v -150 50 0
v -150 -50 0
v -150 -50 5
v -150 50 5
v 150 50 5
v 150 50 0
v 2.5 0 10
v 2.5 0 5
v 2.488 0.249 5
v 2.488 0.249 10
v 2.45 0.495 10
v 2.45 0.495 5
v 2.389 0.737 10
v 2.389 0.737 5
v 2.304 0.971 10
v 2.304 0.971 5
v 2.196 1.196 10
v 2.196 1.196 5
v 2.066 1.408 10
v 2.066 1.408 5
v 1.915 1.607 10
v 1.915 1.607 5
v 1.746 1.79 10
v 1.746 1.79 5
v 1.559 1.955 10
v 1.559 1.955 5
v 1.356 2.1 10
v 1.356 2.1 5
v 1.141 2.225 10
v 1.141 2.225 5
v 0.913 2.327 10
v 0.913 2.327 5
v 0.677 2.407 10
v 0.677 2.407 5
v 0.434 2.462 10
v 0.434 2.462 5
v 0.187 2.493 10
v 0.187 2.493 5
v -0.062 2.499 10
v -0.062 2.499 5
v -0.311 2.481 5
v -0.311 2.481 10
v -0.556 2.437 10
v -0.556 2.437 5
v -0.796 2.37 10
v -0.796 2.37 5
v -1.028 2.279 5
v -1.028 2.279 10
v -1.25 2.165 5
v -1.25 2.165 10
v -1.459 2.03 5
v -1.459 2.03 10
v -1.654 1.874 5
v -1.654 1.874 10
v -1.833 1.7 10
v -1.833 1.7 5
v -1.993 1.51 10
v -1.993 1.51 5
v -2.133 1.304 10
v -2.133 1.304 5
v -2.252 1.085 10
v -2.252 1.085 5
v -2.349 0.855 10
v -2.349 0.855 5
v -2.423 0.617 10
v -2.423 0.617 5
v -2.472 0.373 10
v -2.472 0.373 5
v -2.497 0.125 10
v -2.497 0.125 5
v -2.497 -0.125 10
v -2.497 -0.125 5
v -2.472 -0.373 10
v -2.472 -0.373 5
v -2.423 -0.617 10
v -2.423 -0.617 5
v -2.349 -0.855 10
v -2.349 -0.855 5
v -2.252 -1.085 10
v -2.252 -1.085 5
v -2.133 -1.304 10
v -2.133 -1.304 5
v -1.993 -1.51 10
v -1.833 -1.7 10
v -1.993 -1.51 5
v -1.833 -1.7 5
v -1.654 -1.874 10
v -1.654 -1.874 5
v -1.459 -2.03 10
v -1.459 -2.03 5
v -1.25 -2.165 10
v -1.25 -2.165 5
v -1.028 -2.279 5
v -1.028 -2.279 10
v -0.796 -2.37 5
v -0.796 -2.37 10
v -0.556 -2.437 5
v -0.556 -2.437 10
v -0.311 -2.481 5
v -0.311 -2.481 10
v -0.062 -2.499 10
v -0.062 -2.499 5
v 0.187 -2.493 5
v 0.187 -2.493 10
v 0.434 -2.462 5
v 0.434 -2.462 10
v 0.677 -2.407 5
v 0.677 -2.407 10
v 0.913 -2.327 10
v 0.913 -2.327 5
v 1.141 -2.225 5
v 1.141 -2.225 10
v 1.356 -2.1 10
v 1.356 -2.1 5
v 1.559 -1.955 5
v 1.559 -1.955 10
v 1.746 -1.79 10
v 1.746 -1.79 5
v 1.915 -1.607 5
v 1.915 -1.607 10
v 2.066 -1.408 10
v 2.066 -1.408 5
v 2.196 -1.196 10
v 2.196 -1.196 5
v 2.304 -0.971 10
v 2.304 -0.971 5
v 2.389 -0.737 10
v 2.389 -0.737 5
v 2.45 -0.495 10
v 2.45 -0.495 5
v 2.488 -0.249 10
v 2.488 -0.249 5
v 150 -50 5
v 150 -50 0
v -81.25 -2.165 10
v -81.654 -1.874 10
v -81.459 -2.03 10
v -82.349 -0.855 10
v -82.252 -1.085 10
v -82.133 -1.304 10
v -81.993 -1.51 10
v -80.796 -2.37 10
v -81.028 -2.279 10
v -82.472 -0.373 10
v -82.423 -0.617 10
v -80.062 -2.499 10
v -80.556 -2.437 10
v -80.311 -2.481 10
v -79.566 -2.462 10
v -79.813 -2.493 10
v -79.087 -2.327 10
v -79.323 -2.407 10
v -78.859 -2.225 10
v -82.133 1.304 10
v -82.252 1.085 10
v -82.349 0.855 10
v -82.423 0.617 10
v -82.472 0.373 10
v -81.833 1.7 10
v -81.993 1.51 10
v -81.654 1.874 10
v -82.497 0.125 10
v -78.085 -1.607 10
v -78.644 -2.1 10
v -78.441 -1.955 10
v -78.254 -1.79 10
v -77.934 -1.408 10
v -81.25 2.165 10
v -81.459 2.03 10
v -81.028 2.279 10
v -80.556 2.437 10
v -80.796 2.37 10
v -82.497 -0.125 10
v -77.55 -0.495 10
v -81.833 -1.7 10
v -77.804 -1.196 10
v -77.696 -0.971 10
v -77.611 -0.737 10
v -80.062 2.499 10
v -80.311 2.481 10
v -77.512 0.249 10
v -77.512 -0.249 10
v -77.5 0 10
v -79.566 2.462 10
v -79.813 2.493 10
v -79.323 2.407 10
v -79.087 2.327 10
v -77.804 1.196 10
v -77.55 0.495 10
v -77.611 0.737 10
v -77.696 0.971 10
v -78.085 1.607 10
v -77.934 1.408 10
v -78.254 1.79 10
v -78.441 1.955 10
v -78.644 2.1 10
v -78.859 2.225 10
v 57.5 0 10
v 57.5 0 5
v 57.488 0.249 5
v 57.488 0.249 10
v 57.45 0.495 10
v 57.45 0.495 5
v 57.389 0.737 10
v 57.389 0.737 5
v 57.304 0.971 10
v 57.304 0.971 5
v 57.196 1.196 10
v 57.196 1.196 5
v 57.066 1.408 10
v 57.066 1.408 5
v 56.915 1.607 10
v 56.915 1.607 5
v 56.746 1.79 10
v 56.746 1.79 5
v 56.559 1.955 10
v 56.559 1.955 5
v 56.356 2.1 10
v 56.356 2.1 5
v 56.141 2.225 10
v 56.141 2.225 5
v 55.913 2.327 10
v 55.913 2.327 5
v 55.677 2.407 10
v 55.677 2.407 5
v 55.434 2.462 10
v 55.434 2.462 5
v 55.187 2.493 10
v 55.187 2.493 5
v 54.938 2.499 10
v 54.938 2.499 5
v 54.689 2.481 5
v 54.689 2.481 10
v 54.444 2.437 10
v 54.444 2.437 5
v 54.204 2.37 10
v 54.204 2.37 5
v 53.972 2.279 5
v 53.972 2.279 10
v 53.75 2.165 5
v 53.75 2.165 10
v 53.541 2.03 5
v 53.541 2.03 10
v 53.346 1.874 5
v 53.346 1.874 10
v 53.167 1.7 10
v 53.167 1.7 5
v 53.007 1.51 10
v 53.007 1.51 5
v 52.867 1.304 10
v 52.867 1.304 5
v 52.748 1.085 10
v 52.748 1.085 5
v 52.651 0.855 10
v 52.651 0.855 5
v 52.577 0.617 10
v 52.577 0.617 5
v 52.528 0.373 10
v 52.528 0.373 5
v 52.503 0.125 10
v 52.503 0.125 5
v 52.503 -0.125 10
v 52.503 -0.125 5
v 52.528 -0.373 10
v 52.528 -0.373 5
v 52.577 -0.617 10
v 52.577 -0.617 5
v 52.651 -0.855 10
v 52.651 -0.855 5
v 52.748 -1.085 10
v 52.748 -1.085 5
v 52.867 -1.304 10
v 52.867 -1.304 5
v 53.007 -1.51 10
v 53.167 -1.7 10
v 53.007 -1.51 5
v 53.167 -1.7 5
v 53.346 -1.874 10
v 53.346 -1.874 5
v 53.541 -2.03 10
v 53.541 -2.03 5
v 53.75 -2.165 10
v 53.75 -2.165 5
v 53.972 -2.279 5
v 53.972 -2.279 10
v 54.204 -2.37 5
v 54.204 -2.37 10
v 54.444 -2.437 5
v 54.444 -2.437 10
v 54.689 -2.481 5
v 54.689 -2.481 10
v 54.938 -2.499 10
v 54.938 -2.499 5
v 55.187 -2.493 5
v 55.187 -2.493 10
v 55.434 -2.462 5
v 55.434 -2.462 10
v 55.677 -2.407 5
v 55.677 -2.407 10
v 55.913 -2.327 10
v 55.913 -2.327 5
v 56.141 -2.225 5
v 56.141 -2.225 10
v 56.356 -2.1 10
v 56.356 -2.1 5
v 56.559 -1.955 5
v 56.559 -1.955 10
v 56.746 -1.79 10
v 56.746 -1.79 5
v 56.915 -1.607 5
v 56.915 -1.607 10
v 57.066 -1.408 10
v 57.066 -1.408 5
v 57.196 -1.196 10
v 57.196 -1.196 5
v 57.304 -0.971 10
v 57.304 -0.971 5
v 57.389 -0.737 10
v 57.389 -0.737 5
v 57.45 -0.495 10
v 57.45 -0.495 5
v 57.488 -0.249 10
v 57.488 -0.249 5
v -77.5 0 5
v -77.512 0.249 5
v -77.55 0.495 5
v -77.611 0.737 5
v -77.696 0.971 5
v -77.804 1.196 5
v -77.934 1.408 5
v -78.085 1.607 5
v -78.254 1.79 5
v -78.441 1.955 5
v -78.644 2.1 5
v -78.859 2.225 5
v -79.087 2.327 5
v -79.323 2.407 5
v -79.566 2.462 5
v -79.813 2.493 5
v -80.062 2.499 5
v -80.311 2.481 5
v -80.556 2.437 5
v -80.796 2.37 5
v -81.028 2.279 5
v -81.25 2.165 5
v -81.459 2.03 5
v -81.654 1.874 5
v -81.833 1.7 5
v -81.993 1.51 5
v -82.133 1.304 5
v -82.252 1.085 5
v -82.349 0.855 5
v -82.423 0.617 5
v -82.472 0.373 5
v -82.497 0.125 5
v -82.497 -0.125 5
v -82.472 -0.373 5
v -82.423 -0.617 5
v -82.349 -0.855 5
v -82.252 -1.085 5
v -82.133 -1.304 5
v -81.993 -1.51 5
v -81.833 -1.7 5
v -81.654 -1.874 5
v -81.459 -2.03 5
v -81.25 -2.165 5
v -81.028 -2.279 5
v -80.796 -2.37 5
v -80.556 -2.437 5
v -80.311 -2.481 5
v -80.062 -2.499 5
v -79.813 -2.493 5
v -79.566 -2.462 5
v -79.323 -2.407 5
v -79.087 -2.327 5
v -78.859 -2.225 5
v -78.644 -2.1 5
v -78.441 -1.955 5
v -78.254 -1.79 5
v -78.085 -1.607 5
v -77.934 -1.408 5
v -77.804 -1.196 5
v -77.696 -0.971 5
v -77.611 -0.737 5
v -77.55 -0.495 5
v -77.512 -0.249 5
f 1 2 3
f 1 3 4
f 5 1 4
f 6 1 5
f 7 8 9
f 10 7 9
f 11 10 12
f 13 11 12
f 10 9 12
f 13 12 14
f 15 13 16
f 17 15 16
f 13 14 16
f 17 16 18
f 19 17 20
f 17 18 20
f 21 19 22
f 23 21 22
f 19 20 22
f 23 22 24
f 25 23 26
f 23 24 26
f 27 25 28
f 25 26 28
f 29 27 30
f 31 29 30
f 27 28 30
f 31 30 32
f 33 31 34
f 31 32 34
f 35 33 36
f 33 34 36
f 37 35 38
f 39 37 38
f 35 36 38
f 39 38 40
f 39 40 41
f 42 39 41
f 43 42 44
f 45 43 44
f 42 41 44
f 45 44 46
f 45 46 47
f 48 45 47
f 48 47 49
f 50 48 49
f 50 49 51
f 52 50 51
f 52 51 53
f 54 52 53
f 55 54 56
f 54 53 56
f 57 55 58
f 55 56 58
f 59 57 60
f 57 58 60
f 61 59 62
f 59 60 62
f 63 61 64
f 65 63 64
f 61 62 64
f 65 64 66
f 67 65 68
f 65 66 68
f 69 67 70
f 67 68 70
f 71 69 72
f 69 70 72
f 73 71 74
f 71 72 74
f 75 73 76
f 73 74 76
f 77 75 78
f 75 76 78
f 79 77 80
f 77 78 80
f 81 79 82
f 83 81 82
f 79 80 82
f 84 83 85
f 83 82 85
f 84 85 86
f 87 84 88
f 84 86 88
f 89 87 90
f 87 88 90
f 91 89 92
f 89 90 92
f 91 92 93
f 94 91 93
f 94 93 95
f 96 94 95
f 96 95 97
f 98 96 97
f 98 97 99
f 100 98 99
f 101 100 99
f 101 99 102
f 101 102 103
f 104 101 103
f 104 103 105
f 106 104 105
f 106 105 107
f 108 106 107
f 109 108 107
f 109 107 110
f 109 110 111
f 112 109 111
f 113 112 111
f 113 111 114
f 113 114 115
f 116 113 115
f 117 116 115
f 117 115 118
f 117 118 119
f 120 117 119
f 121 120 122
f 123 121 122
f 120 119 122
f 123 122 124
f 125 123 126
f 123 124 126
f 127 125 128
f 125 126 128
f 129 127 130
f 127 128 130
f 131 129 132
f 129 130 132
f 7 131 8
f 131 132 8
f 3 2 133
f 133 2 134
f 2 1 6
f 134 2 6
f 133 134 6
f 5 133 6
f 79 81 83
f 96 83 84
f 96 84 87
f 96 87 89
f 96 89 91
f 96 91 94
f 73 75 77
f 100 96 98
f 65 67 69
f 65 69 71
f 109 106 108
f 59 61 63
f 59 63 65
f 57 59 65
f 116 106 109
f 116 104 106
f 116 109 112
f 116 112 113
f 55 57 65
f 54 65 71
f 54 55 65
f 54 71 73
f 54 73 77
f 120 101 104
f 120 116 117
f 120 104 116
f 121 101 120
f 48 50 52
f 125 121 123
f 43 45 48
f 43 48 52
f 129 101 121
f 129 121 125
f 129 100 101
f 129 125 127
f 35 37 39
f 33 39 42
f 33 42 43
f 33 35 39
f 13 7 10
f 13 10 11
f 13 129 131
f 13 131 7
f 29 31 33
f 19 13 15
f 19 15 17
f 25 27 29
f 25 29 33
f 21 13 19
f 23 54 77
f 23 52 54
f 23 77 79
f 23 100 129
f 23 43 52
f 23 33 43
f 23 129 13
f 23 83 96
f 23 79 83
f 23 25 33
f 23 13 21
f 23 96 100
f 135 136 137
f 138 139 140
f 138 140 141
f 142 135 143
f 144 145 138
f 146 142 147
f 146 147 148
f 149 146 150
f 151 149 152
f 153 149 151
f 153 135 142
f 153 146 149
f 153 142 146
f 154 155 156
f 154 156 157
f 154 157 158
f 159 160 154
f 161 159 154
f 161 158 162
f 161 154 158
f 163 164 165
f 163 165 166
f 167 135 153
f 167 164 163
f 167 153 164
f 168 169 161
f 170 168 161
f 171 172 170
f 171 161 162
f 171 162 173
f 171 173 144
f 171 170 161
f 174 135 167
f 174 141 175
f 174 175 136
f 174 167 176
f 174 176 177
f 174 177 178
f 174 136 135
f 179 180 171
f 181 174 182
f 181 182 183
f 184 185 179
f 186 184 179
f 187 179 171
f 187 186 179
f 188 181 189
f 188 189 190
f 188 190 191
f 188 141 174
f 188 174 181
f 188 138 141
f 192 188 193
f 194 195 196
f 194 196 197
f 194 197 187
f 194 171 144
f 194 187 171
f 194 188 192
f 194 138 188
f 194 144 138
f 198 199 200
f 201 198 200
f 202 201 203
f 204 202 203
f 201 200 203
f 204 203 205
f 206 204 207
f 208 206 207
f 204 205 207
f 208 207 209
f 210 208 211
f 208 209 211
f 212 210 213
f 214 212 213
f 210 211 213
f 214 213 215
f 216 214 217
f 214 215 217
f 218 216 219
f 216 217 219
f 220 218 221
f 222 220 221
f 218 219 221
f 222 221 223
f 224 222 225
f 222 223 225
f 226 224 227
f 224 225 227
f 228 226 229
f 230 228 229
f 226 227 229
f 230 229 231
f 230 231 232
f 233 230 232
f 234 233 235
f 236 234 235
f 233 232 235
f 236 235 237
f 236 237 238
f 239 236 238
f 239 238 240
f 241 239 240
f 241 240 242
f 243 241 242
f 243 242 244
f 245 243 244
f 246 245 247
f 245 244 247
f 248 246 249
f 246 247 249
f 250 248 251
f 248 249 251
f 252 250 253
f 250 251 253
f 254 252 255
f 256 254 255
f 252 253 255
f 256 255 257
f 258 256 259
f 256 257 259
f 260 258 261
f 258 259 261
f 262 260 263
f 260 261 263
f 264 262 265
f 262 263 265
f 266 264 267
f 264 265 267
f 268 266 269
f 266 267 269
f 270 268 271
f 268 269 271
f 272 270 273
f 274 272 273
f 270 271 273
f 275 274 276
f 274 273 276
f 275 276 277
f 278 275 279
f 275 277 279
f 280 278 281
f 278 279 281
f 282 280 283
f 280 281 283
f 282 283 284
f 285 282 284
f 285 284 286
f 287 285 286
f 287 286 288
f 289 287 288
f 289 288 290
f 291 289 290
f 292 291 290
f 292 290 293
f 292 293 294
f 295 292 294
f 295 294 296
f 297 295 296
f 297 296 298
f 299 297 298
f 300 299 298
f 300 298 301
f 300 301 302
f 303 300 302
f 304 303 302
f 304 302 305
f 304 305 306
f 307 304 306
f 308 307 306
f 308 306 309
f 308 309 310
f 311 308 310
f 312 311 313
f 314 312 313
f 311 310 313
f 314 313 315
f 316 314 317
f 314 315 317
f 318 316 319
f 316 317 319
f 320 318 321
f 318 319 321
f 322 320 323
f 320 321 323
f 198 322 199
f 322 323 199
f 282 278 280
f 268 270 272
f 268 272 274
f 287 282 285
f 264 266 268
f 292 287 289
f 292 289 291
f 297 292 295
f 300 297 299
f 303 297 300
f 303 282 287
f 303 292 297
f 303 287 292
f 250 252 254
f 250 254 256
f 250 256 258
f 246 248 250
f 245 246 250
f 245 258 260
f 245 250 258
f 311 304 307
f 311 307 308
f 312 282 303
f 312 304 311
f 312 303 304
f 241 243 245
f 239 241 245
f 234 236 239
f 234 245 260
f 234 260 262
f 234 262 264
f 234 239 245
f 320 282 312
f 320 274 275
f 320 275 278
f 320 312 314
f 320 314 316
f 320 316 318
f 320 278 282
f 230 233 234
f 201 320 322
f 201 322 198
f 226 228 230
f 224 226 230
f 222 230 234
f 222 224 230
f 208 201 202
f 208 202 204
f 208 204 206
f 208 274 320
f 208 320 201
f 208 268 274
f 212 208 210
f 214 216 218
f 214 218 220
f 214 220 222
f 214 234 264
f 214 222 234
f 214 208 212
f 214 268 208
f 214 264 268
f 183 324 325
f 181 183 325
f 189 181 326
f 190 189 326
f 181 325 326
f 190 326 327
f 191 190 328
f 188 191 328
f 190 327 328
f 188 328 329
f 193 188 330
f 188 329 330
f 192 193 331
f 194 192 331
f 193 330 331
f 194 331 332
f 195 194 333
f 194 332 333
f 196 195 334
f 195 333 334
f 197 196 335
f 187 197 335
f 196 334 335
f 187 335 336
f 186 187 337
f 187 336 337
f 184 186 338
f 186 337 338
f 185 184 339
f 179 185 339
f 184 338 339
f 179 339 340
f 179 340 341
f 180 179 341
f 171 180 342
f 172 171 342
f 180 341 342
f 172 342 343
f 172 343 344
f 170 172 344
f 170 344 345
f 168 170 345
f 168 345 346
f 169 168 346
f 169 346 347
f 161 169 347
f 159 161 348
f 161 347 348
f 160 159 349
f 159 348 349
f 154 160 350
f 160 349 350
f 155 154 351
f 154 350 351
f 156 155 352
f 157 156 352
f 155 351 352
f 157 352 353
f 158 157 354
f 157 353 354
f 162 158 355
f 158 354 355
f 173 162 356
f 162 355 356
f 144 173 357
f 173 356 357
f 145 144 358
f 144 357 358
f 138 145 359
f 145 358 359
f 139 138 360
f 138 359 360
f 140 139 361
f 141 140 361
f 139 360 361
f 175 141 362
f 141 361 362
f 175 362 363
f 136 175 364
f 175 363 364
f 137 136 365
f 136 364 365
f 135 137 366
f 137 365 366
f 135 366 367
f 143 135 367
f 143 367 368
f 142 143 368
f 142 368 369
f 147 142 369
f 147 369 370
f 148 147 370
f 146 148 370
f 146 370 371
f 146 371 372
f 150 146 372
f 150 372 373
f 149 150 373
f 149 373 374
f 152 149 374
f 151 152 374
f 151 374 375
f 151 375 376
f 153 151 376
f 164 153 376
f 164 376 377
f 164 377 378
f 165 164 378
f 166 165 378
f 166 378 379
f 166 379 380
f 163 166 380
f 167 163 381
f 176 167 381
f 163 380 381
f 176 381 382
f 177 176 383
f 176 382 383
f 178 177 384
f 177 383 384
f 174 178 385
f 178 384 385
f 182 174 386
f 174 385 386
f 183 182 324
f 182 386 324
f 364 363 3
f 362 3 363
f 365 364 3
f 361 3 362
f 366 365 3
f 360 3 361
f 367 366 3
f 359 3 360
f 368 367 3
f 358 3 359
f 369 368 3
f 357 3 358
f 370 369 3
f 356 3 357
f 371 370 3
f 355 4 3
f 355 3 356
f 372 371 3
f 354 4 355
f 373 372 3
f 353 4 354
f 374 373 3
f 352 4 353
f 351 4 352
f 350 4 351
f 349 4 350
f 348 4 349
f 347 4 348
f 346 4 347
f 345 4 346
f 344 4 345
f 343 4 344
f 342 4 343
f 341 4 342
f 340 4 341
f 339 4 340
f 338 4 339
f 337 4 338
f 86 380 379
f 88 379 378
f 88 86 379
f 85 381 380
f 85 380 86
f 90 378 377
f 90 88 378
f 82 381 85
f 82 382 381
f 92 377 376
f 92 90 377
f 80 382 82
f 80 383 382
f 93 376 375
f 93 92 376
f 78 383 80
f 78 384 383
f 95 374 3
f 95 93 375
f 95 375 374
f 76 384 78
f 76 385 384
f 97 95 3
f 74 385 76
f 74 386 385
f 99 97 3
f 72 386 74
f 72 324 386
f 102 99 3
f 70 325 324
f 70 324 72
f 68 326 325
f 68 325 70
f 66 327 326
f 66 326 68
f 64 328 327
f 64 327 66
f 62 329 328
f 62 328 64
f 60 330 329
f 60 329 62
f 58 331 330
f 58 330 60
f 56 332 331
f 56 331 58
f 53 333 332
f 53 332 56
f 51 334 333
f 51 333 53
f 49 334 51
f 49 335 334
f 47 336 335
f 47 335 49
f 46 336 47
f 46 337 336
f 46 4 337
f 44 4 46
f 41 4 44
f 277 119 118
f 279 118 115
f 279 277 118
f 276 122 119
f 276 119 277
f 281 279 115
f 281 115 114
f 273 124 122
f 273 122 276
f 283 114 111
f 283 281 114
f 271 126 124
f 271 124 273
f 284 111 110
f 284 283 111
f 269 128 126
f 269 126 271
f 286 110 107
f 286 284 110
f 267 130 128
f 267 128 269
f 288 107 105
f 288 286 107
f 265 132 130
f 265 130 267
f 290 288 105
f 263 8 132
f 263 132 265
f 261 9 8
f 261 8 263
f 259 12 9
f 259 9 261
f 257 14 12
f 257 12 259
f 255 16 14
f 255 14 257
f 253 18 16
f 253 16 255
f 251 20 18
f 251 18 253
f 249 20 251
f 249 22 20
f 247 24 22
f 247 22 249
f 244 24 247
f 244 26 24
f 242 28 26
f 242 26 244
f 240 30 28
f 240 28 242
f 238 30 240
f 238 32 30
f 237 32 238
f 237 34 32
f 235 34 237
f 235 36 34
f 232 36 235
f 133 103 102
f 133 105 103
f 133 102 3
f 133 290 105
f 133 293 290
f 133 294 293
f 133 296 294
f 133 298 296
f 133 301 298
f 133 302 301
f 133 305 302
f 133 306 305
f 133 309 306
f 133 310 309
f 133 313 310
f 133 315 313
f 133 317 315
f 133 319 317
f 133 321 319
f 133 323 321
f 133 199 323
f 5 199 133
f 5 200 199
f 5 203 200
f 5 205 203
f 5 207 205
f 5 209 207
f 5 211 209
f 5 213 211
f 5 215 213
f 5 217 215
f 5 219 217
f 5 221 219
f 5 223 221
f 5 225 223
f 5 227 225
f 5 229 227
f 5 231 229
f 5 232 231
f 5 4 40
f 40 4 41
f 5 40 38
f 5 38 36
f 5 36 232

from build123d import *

# Parameters (mm, degrees)
F0_W     = 300
F0_H     = 100
F1_DEPTH = 5
F2_R     = 2.5
F3_DEPTH = 5
F4_DEPTH = 5


with BuildPart() as f1:
    # F0 (on Top) → F1 (new body)
    with BuildSketch(Plane.XY):
        Rectangle(F0_W, F0_H)
    extrude(amount=F1_DEPTH)

    # F2 (on face) → F3 (join)
    with BuildSketch(Plane.XY.offset(5)):
        Circle(F2_R)
        with Locations((-80, 0)):
            Circle(F2_R)
    extrude(amount=F3_DEPTH)

    # F2 (on face) → F4 (join)
    with BuildSketch(Plane.XY.offset(5)):
        Circle(F2_R)
        with Locations((-80, 0)):
            Circle(F2_R)
        with Locations((55, 0)):
            Circle(F2_R)
    extrude(amount=F4_DEPTH)


solid = f1.part
